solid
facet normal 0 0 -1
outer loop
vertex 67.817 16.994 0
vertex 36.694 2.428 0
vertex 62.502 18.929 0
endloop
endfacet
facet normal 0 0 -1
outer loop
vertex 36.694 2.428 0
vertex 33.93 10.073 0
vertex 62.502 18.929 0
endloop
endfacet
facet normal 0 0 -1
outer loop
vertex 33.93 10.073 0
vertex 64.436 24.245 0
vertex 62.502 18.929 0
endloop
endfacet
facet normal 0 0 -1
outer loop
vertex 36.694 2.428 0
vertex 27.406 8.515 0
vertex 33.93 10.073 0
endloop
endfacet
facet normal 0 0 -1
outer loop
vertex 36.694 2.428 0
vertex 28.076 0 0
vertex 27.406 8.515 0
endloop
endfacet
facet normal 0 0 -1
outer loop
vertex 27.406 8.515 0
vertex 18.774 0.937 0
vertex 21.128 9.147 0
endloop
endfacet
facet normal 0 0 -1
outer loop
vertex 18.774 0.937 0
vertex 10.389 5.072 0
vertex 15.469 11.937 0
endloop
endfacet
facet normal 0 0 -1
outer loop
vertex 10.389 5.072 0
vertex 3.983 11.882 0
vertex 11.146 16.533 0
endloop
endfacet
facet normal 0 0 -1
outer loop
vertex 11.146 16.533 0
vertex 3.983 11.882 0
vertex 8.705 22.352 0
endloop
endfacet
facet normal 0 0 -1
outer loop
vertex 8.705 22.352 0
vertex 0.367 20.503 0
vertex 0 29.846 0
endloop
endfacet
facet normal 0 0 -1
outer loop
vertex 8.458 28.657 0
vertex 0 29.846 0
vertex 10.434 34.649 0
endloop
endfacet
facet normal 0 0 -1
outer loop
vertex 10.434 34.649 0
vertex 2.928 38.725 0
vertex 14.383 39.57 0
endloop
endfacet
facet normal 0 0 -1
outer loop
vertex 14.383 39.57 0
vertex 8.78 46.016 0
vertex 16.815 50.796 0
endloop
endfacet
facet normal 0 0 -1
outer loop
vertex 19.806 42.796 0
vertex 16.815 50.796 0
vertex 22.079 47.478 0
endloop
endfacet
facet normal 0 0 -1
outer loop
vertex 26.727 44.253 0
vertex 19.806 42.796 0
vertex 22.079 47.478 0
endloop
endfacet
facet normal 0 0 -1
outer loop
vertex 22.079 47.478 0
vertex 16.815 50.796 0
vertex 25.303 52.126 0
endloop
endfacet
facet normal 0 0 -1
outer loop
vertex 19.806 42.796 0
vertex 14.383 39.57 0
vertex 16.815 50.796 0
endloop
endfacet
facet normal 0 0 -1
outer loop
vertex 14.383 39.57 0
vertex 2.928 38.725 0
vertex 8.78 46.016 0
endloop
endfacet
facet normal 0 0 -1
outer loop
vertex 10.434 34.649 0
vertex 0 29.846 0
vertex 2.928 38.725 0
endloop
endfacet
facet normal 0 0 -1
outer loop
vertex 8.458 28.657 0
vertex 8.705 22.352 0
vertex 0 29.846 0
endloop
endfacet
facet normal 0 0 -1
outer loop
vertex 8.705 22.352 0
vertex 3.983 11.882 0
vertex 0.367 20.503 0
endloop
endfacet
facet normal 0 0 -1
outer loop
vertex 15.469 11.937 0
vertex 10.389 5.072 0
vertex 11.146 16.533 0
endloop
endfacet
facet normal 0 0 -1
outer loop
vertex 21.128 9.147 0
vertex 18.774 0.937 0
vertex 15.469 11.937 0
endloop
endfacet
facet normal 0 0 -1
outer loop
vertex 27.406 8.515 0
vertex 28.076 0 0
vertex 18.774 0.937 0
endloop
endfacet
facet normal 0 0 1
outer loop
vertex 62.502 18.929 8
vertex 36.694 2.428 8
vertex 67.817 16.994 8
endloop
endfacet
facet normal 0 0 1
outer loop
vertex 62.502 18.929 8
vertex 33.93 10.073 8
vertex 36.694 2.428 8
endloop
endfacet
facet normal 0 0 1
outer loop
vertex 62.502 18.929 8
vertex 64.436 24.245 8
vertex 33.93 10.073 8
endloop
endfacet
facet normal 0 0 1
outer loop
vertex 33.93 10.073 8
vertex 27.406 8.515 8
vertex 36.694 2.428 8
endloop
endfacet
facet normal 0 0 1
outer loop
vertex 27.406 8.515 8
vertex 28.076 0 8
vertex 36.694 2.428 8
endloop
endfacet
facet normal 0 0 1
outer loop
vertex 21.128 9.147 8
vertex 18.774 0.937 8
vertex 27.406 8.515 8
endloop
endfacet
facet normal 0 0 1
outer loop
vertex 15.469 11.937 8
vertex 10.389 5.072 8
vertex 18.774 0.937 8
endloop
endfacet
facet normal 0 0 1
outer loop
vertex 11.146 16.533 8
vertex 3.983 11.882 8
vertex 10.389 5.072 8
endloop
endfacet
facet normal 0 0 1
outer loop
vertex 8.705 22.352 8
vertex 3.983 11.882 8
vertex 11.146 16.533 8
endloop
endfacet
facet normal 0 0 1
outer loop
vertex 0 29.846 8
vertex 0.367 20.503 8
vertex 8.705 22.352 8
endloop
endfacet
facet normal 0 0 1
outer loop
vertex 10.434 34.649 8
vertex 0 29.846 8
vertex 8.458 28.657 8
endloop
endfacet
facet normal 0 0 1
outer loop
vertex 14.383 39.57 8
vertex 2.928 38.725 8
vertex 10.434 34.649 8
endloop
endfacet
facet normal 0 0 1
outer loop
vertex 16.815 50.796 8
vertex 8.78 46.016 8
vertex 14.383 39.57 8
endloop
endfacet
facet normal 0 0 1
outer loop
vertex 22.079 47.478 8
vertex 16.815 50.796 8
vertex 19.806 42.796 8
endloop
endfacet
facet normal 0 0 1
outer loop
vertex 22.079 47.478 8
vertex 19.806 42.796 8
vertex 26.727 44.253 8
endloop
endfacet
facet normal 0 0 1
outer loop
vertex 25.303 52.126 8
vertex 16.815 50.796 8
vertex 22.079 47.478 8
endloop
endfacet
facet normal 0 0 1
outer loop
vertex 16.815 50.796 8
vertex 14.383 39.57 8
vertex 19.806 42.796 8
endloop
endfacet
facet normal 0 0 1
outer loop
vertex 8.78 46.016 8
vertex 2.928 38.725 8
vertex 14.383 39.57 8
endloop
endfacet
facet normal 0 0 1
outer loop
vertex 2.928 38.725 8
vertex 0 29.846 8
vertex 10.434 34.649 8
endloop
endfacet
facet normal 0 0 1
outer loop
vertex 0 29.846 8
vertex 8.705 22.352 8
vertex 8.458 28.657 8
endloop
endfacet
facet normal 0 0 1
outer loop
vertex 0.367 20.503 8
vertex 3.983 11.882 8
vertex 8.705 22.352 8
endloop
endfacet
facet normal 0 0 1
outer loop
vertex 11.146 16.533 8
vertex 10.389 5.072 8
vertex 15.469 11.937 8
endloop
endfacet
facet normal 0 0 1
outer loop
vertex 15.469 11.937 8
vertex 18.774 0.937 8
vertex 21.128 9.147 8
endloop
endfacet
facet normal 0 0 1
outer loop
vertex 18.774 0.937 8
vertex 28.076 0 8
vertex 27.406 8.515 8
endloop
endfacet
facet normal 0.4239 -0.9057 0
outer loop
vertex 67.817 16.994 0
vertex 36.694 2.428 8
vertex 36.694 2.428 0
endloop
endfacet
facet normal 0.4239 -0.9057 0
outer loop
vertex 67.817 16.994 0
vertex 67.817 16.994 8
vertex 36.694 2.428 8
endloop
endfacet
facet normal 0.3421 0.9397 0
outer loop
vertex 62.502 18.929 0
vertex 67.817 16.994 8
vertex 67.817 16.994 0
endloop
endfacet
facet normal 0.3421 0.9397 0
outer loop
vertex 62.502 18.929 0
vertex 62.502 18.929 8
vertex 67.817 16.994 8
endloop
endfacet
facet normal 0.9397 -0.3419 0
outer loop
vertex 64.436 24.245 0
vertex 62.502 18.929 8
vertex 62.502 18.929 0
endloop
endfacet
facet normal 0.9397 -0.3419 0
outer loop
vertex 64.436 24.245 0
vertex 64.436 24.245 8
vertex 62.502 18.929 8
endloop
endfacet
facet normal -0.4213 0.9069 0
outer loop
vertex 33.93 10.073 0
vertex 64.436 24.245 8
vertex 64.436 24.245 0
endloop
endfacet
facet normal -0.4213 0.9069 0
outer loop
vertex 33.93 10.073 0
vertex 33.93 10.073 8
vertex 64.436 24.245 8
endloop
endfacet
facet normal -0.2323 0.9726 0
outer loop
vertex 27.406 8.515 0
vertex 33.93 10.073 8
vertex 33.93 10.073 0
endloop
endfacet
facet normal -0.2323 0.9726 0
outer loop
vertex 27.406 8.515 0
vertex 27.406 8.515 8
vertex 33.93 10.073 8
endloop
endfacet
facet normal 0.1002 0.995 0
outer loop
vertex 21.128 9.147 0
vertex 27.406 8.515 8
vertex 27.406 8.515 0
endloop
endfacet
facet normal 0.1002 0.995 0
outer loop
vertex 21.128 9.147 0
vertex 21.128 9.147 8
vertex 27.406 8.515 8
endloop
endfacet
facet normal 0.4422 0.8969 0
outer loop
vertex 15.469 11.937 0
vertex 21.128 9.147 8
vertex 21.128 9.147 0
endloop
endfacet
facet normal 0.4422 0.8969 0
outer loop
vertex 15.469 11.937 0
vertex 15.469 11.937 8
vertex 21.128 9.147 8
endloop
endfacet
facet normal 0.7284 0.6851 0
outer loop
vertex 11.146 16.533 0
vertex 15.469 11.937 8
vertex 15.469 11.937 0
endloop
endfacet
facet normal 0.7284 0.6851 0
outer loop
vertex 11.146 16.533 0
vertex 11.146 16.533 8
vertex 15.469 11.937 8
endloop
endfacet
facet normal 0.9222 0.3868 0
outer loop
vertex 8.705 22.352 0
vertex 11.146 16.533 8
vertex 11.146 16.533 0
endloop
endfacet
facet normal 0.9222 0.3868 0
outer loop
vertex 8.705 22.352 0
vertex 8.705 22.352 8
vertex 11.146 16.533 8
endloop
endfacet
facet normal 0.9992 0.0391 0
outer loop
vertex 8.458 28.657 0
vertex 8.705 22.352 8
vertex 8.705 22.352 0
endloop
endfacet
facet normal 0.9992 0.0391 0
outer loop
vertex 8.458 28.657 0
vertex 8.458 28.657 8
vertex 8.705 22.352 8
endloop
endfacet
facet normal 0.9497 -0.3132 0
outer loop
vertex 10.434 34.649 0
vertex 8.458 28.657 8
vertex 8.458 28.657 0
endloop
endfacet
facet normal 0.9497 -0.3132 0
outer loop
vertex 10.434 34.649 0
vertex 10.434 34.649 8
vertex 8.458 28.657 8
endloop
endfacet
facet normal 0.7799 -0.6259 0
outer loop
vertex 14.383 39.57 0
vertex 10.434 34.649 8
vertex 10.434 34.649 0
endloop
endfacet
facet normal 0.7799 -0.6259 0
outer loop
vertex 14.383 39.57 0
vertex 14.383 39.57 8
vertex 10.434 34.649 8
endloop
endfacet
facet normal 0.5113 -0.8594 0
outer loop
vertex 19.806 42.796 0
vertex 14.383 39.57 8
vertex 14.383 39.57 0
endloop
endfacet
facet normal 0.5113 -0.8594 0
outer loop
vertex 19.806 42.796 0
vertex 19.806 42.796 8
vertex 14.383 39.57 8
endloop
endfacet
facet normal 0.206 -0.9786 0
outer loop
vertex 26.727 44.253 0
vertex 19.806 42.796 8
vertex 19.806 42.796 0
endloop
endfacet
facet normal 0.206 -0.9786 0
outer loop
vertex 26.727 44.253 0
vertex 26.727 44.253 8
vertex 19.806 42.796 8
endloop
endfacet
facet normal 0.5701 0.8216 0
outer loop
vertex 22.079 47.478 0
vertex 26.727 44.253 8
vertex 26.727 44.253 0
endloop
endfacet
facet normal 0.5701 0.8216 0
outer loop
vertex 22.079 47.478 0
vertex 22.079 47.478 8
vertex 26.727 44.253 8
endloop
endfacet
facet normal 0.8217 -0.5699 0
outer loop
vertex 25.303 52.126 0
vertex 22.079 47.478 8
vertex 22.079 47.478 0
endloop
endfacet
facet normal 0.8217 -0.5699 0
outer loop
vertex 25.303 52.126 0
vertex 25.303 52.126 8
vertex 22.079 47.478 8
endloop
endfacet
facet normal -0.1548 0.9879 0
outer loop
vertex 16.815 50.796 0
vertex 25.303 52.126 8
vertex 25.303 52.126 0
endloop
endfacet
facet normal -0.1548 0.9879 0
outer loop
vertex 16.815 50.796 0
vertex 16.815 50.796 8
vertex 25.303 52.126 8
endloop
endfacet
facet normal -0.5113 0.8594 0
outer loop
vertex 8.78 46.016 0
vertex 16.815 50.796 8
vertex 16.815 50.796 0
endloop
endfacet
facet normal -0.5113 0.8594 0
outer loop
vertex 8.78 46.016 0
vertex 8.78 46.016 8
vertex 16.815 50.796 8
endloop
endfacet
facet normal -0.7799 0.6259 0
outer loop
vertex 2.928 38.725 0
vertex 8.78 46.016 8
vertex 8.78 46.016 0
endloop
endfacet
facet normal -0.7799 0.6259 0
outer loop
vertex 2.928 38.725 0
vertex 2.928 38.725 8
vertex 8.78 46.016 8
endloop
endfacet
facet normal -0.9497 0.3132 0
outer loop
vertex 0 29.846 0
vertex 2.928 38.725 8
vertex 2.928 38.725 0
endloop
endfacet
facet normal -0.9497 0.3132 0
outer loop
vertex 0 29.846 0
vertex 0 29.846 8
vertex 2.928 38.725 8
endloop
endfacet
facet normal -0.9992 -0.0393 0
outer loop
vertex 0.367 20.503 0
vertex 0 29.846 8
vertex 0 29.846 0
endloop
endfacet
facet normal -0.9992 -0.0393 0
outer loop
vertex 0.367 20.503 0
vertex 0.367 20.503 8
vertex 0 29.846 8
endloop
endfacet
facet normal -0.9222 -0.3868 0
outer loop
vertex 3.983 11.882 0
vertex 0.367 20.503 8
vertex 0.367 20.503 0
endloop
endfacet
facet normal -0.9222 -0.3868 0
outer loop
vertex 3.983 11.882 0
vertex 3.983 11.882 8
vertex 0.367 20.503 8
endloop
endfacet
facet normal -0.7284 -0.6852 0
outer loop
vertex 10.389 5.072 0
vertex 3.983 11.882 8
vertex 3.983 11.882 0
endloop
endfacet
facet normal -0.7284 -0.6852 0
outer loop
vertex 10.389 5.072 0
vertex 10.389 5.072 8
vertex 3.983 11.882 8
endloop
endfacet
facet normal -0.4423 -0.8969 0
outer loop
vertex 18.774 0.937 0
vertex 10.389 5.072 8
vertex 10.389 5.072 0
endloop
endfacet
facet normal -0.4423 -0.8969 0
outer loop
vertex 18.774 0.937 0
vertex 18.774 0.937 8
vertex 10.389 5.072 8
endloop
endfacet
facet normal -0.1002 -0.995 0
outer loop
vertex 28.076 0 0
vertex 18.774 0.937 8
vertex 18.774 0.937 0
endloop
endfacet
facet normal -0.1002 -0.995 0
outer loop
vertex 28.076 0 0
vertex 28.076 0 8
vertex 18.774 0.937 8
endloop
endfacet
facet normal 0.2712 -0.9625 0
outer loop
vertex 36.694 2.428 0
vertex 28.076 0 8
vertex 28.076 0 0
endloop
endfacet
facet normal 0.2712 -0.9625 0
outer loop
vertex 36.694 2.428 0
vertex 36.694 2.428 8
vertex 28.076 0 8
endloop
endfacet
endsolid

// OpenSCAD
$fn = 32;

// ----------------------------------------------------------------------
// Hook plate: curl radius 22 mm over 205 degrees, 8 mm thick band
// ----------------------------------------------------------------------

// --- parameters (mm) ---
profile_height = 8;       // extrusion height
profile_points = 26;      // points of the closed outline

profile = [[22.079, 47.478], [25.303, 52.126], [16.815, 50.796], [8.78, 46.016], [2.928, 38.725], [0, 29.846], [0.367, 20.503], [3.983, 11.882], [10.389, 5.072], [18.774, 0.937], [28.076, 0], [36.694, 2.428], [67.817, 16.994], [62.502, 18.929], [64.436, 24.245], [33.93, 10.073], [27.406, 8.515], [21.128, 9.147], [15.469, 11.937], [11.146, 16.533], [8.705, 22.352], [8.458, 28.657], [10.434, 34.649], [14.383, 39.57], [19.806, 42.796], [26.727, 44.253]];  // single closed polygon, 26 points, counter clockwise

// --- the one profile operation ---
linear_extrude(height = profile_height) polygon(points = profile);
